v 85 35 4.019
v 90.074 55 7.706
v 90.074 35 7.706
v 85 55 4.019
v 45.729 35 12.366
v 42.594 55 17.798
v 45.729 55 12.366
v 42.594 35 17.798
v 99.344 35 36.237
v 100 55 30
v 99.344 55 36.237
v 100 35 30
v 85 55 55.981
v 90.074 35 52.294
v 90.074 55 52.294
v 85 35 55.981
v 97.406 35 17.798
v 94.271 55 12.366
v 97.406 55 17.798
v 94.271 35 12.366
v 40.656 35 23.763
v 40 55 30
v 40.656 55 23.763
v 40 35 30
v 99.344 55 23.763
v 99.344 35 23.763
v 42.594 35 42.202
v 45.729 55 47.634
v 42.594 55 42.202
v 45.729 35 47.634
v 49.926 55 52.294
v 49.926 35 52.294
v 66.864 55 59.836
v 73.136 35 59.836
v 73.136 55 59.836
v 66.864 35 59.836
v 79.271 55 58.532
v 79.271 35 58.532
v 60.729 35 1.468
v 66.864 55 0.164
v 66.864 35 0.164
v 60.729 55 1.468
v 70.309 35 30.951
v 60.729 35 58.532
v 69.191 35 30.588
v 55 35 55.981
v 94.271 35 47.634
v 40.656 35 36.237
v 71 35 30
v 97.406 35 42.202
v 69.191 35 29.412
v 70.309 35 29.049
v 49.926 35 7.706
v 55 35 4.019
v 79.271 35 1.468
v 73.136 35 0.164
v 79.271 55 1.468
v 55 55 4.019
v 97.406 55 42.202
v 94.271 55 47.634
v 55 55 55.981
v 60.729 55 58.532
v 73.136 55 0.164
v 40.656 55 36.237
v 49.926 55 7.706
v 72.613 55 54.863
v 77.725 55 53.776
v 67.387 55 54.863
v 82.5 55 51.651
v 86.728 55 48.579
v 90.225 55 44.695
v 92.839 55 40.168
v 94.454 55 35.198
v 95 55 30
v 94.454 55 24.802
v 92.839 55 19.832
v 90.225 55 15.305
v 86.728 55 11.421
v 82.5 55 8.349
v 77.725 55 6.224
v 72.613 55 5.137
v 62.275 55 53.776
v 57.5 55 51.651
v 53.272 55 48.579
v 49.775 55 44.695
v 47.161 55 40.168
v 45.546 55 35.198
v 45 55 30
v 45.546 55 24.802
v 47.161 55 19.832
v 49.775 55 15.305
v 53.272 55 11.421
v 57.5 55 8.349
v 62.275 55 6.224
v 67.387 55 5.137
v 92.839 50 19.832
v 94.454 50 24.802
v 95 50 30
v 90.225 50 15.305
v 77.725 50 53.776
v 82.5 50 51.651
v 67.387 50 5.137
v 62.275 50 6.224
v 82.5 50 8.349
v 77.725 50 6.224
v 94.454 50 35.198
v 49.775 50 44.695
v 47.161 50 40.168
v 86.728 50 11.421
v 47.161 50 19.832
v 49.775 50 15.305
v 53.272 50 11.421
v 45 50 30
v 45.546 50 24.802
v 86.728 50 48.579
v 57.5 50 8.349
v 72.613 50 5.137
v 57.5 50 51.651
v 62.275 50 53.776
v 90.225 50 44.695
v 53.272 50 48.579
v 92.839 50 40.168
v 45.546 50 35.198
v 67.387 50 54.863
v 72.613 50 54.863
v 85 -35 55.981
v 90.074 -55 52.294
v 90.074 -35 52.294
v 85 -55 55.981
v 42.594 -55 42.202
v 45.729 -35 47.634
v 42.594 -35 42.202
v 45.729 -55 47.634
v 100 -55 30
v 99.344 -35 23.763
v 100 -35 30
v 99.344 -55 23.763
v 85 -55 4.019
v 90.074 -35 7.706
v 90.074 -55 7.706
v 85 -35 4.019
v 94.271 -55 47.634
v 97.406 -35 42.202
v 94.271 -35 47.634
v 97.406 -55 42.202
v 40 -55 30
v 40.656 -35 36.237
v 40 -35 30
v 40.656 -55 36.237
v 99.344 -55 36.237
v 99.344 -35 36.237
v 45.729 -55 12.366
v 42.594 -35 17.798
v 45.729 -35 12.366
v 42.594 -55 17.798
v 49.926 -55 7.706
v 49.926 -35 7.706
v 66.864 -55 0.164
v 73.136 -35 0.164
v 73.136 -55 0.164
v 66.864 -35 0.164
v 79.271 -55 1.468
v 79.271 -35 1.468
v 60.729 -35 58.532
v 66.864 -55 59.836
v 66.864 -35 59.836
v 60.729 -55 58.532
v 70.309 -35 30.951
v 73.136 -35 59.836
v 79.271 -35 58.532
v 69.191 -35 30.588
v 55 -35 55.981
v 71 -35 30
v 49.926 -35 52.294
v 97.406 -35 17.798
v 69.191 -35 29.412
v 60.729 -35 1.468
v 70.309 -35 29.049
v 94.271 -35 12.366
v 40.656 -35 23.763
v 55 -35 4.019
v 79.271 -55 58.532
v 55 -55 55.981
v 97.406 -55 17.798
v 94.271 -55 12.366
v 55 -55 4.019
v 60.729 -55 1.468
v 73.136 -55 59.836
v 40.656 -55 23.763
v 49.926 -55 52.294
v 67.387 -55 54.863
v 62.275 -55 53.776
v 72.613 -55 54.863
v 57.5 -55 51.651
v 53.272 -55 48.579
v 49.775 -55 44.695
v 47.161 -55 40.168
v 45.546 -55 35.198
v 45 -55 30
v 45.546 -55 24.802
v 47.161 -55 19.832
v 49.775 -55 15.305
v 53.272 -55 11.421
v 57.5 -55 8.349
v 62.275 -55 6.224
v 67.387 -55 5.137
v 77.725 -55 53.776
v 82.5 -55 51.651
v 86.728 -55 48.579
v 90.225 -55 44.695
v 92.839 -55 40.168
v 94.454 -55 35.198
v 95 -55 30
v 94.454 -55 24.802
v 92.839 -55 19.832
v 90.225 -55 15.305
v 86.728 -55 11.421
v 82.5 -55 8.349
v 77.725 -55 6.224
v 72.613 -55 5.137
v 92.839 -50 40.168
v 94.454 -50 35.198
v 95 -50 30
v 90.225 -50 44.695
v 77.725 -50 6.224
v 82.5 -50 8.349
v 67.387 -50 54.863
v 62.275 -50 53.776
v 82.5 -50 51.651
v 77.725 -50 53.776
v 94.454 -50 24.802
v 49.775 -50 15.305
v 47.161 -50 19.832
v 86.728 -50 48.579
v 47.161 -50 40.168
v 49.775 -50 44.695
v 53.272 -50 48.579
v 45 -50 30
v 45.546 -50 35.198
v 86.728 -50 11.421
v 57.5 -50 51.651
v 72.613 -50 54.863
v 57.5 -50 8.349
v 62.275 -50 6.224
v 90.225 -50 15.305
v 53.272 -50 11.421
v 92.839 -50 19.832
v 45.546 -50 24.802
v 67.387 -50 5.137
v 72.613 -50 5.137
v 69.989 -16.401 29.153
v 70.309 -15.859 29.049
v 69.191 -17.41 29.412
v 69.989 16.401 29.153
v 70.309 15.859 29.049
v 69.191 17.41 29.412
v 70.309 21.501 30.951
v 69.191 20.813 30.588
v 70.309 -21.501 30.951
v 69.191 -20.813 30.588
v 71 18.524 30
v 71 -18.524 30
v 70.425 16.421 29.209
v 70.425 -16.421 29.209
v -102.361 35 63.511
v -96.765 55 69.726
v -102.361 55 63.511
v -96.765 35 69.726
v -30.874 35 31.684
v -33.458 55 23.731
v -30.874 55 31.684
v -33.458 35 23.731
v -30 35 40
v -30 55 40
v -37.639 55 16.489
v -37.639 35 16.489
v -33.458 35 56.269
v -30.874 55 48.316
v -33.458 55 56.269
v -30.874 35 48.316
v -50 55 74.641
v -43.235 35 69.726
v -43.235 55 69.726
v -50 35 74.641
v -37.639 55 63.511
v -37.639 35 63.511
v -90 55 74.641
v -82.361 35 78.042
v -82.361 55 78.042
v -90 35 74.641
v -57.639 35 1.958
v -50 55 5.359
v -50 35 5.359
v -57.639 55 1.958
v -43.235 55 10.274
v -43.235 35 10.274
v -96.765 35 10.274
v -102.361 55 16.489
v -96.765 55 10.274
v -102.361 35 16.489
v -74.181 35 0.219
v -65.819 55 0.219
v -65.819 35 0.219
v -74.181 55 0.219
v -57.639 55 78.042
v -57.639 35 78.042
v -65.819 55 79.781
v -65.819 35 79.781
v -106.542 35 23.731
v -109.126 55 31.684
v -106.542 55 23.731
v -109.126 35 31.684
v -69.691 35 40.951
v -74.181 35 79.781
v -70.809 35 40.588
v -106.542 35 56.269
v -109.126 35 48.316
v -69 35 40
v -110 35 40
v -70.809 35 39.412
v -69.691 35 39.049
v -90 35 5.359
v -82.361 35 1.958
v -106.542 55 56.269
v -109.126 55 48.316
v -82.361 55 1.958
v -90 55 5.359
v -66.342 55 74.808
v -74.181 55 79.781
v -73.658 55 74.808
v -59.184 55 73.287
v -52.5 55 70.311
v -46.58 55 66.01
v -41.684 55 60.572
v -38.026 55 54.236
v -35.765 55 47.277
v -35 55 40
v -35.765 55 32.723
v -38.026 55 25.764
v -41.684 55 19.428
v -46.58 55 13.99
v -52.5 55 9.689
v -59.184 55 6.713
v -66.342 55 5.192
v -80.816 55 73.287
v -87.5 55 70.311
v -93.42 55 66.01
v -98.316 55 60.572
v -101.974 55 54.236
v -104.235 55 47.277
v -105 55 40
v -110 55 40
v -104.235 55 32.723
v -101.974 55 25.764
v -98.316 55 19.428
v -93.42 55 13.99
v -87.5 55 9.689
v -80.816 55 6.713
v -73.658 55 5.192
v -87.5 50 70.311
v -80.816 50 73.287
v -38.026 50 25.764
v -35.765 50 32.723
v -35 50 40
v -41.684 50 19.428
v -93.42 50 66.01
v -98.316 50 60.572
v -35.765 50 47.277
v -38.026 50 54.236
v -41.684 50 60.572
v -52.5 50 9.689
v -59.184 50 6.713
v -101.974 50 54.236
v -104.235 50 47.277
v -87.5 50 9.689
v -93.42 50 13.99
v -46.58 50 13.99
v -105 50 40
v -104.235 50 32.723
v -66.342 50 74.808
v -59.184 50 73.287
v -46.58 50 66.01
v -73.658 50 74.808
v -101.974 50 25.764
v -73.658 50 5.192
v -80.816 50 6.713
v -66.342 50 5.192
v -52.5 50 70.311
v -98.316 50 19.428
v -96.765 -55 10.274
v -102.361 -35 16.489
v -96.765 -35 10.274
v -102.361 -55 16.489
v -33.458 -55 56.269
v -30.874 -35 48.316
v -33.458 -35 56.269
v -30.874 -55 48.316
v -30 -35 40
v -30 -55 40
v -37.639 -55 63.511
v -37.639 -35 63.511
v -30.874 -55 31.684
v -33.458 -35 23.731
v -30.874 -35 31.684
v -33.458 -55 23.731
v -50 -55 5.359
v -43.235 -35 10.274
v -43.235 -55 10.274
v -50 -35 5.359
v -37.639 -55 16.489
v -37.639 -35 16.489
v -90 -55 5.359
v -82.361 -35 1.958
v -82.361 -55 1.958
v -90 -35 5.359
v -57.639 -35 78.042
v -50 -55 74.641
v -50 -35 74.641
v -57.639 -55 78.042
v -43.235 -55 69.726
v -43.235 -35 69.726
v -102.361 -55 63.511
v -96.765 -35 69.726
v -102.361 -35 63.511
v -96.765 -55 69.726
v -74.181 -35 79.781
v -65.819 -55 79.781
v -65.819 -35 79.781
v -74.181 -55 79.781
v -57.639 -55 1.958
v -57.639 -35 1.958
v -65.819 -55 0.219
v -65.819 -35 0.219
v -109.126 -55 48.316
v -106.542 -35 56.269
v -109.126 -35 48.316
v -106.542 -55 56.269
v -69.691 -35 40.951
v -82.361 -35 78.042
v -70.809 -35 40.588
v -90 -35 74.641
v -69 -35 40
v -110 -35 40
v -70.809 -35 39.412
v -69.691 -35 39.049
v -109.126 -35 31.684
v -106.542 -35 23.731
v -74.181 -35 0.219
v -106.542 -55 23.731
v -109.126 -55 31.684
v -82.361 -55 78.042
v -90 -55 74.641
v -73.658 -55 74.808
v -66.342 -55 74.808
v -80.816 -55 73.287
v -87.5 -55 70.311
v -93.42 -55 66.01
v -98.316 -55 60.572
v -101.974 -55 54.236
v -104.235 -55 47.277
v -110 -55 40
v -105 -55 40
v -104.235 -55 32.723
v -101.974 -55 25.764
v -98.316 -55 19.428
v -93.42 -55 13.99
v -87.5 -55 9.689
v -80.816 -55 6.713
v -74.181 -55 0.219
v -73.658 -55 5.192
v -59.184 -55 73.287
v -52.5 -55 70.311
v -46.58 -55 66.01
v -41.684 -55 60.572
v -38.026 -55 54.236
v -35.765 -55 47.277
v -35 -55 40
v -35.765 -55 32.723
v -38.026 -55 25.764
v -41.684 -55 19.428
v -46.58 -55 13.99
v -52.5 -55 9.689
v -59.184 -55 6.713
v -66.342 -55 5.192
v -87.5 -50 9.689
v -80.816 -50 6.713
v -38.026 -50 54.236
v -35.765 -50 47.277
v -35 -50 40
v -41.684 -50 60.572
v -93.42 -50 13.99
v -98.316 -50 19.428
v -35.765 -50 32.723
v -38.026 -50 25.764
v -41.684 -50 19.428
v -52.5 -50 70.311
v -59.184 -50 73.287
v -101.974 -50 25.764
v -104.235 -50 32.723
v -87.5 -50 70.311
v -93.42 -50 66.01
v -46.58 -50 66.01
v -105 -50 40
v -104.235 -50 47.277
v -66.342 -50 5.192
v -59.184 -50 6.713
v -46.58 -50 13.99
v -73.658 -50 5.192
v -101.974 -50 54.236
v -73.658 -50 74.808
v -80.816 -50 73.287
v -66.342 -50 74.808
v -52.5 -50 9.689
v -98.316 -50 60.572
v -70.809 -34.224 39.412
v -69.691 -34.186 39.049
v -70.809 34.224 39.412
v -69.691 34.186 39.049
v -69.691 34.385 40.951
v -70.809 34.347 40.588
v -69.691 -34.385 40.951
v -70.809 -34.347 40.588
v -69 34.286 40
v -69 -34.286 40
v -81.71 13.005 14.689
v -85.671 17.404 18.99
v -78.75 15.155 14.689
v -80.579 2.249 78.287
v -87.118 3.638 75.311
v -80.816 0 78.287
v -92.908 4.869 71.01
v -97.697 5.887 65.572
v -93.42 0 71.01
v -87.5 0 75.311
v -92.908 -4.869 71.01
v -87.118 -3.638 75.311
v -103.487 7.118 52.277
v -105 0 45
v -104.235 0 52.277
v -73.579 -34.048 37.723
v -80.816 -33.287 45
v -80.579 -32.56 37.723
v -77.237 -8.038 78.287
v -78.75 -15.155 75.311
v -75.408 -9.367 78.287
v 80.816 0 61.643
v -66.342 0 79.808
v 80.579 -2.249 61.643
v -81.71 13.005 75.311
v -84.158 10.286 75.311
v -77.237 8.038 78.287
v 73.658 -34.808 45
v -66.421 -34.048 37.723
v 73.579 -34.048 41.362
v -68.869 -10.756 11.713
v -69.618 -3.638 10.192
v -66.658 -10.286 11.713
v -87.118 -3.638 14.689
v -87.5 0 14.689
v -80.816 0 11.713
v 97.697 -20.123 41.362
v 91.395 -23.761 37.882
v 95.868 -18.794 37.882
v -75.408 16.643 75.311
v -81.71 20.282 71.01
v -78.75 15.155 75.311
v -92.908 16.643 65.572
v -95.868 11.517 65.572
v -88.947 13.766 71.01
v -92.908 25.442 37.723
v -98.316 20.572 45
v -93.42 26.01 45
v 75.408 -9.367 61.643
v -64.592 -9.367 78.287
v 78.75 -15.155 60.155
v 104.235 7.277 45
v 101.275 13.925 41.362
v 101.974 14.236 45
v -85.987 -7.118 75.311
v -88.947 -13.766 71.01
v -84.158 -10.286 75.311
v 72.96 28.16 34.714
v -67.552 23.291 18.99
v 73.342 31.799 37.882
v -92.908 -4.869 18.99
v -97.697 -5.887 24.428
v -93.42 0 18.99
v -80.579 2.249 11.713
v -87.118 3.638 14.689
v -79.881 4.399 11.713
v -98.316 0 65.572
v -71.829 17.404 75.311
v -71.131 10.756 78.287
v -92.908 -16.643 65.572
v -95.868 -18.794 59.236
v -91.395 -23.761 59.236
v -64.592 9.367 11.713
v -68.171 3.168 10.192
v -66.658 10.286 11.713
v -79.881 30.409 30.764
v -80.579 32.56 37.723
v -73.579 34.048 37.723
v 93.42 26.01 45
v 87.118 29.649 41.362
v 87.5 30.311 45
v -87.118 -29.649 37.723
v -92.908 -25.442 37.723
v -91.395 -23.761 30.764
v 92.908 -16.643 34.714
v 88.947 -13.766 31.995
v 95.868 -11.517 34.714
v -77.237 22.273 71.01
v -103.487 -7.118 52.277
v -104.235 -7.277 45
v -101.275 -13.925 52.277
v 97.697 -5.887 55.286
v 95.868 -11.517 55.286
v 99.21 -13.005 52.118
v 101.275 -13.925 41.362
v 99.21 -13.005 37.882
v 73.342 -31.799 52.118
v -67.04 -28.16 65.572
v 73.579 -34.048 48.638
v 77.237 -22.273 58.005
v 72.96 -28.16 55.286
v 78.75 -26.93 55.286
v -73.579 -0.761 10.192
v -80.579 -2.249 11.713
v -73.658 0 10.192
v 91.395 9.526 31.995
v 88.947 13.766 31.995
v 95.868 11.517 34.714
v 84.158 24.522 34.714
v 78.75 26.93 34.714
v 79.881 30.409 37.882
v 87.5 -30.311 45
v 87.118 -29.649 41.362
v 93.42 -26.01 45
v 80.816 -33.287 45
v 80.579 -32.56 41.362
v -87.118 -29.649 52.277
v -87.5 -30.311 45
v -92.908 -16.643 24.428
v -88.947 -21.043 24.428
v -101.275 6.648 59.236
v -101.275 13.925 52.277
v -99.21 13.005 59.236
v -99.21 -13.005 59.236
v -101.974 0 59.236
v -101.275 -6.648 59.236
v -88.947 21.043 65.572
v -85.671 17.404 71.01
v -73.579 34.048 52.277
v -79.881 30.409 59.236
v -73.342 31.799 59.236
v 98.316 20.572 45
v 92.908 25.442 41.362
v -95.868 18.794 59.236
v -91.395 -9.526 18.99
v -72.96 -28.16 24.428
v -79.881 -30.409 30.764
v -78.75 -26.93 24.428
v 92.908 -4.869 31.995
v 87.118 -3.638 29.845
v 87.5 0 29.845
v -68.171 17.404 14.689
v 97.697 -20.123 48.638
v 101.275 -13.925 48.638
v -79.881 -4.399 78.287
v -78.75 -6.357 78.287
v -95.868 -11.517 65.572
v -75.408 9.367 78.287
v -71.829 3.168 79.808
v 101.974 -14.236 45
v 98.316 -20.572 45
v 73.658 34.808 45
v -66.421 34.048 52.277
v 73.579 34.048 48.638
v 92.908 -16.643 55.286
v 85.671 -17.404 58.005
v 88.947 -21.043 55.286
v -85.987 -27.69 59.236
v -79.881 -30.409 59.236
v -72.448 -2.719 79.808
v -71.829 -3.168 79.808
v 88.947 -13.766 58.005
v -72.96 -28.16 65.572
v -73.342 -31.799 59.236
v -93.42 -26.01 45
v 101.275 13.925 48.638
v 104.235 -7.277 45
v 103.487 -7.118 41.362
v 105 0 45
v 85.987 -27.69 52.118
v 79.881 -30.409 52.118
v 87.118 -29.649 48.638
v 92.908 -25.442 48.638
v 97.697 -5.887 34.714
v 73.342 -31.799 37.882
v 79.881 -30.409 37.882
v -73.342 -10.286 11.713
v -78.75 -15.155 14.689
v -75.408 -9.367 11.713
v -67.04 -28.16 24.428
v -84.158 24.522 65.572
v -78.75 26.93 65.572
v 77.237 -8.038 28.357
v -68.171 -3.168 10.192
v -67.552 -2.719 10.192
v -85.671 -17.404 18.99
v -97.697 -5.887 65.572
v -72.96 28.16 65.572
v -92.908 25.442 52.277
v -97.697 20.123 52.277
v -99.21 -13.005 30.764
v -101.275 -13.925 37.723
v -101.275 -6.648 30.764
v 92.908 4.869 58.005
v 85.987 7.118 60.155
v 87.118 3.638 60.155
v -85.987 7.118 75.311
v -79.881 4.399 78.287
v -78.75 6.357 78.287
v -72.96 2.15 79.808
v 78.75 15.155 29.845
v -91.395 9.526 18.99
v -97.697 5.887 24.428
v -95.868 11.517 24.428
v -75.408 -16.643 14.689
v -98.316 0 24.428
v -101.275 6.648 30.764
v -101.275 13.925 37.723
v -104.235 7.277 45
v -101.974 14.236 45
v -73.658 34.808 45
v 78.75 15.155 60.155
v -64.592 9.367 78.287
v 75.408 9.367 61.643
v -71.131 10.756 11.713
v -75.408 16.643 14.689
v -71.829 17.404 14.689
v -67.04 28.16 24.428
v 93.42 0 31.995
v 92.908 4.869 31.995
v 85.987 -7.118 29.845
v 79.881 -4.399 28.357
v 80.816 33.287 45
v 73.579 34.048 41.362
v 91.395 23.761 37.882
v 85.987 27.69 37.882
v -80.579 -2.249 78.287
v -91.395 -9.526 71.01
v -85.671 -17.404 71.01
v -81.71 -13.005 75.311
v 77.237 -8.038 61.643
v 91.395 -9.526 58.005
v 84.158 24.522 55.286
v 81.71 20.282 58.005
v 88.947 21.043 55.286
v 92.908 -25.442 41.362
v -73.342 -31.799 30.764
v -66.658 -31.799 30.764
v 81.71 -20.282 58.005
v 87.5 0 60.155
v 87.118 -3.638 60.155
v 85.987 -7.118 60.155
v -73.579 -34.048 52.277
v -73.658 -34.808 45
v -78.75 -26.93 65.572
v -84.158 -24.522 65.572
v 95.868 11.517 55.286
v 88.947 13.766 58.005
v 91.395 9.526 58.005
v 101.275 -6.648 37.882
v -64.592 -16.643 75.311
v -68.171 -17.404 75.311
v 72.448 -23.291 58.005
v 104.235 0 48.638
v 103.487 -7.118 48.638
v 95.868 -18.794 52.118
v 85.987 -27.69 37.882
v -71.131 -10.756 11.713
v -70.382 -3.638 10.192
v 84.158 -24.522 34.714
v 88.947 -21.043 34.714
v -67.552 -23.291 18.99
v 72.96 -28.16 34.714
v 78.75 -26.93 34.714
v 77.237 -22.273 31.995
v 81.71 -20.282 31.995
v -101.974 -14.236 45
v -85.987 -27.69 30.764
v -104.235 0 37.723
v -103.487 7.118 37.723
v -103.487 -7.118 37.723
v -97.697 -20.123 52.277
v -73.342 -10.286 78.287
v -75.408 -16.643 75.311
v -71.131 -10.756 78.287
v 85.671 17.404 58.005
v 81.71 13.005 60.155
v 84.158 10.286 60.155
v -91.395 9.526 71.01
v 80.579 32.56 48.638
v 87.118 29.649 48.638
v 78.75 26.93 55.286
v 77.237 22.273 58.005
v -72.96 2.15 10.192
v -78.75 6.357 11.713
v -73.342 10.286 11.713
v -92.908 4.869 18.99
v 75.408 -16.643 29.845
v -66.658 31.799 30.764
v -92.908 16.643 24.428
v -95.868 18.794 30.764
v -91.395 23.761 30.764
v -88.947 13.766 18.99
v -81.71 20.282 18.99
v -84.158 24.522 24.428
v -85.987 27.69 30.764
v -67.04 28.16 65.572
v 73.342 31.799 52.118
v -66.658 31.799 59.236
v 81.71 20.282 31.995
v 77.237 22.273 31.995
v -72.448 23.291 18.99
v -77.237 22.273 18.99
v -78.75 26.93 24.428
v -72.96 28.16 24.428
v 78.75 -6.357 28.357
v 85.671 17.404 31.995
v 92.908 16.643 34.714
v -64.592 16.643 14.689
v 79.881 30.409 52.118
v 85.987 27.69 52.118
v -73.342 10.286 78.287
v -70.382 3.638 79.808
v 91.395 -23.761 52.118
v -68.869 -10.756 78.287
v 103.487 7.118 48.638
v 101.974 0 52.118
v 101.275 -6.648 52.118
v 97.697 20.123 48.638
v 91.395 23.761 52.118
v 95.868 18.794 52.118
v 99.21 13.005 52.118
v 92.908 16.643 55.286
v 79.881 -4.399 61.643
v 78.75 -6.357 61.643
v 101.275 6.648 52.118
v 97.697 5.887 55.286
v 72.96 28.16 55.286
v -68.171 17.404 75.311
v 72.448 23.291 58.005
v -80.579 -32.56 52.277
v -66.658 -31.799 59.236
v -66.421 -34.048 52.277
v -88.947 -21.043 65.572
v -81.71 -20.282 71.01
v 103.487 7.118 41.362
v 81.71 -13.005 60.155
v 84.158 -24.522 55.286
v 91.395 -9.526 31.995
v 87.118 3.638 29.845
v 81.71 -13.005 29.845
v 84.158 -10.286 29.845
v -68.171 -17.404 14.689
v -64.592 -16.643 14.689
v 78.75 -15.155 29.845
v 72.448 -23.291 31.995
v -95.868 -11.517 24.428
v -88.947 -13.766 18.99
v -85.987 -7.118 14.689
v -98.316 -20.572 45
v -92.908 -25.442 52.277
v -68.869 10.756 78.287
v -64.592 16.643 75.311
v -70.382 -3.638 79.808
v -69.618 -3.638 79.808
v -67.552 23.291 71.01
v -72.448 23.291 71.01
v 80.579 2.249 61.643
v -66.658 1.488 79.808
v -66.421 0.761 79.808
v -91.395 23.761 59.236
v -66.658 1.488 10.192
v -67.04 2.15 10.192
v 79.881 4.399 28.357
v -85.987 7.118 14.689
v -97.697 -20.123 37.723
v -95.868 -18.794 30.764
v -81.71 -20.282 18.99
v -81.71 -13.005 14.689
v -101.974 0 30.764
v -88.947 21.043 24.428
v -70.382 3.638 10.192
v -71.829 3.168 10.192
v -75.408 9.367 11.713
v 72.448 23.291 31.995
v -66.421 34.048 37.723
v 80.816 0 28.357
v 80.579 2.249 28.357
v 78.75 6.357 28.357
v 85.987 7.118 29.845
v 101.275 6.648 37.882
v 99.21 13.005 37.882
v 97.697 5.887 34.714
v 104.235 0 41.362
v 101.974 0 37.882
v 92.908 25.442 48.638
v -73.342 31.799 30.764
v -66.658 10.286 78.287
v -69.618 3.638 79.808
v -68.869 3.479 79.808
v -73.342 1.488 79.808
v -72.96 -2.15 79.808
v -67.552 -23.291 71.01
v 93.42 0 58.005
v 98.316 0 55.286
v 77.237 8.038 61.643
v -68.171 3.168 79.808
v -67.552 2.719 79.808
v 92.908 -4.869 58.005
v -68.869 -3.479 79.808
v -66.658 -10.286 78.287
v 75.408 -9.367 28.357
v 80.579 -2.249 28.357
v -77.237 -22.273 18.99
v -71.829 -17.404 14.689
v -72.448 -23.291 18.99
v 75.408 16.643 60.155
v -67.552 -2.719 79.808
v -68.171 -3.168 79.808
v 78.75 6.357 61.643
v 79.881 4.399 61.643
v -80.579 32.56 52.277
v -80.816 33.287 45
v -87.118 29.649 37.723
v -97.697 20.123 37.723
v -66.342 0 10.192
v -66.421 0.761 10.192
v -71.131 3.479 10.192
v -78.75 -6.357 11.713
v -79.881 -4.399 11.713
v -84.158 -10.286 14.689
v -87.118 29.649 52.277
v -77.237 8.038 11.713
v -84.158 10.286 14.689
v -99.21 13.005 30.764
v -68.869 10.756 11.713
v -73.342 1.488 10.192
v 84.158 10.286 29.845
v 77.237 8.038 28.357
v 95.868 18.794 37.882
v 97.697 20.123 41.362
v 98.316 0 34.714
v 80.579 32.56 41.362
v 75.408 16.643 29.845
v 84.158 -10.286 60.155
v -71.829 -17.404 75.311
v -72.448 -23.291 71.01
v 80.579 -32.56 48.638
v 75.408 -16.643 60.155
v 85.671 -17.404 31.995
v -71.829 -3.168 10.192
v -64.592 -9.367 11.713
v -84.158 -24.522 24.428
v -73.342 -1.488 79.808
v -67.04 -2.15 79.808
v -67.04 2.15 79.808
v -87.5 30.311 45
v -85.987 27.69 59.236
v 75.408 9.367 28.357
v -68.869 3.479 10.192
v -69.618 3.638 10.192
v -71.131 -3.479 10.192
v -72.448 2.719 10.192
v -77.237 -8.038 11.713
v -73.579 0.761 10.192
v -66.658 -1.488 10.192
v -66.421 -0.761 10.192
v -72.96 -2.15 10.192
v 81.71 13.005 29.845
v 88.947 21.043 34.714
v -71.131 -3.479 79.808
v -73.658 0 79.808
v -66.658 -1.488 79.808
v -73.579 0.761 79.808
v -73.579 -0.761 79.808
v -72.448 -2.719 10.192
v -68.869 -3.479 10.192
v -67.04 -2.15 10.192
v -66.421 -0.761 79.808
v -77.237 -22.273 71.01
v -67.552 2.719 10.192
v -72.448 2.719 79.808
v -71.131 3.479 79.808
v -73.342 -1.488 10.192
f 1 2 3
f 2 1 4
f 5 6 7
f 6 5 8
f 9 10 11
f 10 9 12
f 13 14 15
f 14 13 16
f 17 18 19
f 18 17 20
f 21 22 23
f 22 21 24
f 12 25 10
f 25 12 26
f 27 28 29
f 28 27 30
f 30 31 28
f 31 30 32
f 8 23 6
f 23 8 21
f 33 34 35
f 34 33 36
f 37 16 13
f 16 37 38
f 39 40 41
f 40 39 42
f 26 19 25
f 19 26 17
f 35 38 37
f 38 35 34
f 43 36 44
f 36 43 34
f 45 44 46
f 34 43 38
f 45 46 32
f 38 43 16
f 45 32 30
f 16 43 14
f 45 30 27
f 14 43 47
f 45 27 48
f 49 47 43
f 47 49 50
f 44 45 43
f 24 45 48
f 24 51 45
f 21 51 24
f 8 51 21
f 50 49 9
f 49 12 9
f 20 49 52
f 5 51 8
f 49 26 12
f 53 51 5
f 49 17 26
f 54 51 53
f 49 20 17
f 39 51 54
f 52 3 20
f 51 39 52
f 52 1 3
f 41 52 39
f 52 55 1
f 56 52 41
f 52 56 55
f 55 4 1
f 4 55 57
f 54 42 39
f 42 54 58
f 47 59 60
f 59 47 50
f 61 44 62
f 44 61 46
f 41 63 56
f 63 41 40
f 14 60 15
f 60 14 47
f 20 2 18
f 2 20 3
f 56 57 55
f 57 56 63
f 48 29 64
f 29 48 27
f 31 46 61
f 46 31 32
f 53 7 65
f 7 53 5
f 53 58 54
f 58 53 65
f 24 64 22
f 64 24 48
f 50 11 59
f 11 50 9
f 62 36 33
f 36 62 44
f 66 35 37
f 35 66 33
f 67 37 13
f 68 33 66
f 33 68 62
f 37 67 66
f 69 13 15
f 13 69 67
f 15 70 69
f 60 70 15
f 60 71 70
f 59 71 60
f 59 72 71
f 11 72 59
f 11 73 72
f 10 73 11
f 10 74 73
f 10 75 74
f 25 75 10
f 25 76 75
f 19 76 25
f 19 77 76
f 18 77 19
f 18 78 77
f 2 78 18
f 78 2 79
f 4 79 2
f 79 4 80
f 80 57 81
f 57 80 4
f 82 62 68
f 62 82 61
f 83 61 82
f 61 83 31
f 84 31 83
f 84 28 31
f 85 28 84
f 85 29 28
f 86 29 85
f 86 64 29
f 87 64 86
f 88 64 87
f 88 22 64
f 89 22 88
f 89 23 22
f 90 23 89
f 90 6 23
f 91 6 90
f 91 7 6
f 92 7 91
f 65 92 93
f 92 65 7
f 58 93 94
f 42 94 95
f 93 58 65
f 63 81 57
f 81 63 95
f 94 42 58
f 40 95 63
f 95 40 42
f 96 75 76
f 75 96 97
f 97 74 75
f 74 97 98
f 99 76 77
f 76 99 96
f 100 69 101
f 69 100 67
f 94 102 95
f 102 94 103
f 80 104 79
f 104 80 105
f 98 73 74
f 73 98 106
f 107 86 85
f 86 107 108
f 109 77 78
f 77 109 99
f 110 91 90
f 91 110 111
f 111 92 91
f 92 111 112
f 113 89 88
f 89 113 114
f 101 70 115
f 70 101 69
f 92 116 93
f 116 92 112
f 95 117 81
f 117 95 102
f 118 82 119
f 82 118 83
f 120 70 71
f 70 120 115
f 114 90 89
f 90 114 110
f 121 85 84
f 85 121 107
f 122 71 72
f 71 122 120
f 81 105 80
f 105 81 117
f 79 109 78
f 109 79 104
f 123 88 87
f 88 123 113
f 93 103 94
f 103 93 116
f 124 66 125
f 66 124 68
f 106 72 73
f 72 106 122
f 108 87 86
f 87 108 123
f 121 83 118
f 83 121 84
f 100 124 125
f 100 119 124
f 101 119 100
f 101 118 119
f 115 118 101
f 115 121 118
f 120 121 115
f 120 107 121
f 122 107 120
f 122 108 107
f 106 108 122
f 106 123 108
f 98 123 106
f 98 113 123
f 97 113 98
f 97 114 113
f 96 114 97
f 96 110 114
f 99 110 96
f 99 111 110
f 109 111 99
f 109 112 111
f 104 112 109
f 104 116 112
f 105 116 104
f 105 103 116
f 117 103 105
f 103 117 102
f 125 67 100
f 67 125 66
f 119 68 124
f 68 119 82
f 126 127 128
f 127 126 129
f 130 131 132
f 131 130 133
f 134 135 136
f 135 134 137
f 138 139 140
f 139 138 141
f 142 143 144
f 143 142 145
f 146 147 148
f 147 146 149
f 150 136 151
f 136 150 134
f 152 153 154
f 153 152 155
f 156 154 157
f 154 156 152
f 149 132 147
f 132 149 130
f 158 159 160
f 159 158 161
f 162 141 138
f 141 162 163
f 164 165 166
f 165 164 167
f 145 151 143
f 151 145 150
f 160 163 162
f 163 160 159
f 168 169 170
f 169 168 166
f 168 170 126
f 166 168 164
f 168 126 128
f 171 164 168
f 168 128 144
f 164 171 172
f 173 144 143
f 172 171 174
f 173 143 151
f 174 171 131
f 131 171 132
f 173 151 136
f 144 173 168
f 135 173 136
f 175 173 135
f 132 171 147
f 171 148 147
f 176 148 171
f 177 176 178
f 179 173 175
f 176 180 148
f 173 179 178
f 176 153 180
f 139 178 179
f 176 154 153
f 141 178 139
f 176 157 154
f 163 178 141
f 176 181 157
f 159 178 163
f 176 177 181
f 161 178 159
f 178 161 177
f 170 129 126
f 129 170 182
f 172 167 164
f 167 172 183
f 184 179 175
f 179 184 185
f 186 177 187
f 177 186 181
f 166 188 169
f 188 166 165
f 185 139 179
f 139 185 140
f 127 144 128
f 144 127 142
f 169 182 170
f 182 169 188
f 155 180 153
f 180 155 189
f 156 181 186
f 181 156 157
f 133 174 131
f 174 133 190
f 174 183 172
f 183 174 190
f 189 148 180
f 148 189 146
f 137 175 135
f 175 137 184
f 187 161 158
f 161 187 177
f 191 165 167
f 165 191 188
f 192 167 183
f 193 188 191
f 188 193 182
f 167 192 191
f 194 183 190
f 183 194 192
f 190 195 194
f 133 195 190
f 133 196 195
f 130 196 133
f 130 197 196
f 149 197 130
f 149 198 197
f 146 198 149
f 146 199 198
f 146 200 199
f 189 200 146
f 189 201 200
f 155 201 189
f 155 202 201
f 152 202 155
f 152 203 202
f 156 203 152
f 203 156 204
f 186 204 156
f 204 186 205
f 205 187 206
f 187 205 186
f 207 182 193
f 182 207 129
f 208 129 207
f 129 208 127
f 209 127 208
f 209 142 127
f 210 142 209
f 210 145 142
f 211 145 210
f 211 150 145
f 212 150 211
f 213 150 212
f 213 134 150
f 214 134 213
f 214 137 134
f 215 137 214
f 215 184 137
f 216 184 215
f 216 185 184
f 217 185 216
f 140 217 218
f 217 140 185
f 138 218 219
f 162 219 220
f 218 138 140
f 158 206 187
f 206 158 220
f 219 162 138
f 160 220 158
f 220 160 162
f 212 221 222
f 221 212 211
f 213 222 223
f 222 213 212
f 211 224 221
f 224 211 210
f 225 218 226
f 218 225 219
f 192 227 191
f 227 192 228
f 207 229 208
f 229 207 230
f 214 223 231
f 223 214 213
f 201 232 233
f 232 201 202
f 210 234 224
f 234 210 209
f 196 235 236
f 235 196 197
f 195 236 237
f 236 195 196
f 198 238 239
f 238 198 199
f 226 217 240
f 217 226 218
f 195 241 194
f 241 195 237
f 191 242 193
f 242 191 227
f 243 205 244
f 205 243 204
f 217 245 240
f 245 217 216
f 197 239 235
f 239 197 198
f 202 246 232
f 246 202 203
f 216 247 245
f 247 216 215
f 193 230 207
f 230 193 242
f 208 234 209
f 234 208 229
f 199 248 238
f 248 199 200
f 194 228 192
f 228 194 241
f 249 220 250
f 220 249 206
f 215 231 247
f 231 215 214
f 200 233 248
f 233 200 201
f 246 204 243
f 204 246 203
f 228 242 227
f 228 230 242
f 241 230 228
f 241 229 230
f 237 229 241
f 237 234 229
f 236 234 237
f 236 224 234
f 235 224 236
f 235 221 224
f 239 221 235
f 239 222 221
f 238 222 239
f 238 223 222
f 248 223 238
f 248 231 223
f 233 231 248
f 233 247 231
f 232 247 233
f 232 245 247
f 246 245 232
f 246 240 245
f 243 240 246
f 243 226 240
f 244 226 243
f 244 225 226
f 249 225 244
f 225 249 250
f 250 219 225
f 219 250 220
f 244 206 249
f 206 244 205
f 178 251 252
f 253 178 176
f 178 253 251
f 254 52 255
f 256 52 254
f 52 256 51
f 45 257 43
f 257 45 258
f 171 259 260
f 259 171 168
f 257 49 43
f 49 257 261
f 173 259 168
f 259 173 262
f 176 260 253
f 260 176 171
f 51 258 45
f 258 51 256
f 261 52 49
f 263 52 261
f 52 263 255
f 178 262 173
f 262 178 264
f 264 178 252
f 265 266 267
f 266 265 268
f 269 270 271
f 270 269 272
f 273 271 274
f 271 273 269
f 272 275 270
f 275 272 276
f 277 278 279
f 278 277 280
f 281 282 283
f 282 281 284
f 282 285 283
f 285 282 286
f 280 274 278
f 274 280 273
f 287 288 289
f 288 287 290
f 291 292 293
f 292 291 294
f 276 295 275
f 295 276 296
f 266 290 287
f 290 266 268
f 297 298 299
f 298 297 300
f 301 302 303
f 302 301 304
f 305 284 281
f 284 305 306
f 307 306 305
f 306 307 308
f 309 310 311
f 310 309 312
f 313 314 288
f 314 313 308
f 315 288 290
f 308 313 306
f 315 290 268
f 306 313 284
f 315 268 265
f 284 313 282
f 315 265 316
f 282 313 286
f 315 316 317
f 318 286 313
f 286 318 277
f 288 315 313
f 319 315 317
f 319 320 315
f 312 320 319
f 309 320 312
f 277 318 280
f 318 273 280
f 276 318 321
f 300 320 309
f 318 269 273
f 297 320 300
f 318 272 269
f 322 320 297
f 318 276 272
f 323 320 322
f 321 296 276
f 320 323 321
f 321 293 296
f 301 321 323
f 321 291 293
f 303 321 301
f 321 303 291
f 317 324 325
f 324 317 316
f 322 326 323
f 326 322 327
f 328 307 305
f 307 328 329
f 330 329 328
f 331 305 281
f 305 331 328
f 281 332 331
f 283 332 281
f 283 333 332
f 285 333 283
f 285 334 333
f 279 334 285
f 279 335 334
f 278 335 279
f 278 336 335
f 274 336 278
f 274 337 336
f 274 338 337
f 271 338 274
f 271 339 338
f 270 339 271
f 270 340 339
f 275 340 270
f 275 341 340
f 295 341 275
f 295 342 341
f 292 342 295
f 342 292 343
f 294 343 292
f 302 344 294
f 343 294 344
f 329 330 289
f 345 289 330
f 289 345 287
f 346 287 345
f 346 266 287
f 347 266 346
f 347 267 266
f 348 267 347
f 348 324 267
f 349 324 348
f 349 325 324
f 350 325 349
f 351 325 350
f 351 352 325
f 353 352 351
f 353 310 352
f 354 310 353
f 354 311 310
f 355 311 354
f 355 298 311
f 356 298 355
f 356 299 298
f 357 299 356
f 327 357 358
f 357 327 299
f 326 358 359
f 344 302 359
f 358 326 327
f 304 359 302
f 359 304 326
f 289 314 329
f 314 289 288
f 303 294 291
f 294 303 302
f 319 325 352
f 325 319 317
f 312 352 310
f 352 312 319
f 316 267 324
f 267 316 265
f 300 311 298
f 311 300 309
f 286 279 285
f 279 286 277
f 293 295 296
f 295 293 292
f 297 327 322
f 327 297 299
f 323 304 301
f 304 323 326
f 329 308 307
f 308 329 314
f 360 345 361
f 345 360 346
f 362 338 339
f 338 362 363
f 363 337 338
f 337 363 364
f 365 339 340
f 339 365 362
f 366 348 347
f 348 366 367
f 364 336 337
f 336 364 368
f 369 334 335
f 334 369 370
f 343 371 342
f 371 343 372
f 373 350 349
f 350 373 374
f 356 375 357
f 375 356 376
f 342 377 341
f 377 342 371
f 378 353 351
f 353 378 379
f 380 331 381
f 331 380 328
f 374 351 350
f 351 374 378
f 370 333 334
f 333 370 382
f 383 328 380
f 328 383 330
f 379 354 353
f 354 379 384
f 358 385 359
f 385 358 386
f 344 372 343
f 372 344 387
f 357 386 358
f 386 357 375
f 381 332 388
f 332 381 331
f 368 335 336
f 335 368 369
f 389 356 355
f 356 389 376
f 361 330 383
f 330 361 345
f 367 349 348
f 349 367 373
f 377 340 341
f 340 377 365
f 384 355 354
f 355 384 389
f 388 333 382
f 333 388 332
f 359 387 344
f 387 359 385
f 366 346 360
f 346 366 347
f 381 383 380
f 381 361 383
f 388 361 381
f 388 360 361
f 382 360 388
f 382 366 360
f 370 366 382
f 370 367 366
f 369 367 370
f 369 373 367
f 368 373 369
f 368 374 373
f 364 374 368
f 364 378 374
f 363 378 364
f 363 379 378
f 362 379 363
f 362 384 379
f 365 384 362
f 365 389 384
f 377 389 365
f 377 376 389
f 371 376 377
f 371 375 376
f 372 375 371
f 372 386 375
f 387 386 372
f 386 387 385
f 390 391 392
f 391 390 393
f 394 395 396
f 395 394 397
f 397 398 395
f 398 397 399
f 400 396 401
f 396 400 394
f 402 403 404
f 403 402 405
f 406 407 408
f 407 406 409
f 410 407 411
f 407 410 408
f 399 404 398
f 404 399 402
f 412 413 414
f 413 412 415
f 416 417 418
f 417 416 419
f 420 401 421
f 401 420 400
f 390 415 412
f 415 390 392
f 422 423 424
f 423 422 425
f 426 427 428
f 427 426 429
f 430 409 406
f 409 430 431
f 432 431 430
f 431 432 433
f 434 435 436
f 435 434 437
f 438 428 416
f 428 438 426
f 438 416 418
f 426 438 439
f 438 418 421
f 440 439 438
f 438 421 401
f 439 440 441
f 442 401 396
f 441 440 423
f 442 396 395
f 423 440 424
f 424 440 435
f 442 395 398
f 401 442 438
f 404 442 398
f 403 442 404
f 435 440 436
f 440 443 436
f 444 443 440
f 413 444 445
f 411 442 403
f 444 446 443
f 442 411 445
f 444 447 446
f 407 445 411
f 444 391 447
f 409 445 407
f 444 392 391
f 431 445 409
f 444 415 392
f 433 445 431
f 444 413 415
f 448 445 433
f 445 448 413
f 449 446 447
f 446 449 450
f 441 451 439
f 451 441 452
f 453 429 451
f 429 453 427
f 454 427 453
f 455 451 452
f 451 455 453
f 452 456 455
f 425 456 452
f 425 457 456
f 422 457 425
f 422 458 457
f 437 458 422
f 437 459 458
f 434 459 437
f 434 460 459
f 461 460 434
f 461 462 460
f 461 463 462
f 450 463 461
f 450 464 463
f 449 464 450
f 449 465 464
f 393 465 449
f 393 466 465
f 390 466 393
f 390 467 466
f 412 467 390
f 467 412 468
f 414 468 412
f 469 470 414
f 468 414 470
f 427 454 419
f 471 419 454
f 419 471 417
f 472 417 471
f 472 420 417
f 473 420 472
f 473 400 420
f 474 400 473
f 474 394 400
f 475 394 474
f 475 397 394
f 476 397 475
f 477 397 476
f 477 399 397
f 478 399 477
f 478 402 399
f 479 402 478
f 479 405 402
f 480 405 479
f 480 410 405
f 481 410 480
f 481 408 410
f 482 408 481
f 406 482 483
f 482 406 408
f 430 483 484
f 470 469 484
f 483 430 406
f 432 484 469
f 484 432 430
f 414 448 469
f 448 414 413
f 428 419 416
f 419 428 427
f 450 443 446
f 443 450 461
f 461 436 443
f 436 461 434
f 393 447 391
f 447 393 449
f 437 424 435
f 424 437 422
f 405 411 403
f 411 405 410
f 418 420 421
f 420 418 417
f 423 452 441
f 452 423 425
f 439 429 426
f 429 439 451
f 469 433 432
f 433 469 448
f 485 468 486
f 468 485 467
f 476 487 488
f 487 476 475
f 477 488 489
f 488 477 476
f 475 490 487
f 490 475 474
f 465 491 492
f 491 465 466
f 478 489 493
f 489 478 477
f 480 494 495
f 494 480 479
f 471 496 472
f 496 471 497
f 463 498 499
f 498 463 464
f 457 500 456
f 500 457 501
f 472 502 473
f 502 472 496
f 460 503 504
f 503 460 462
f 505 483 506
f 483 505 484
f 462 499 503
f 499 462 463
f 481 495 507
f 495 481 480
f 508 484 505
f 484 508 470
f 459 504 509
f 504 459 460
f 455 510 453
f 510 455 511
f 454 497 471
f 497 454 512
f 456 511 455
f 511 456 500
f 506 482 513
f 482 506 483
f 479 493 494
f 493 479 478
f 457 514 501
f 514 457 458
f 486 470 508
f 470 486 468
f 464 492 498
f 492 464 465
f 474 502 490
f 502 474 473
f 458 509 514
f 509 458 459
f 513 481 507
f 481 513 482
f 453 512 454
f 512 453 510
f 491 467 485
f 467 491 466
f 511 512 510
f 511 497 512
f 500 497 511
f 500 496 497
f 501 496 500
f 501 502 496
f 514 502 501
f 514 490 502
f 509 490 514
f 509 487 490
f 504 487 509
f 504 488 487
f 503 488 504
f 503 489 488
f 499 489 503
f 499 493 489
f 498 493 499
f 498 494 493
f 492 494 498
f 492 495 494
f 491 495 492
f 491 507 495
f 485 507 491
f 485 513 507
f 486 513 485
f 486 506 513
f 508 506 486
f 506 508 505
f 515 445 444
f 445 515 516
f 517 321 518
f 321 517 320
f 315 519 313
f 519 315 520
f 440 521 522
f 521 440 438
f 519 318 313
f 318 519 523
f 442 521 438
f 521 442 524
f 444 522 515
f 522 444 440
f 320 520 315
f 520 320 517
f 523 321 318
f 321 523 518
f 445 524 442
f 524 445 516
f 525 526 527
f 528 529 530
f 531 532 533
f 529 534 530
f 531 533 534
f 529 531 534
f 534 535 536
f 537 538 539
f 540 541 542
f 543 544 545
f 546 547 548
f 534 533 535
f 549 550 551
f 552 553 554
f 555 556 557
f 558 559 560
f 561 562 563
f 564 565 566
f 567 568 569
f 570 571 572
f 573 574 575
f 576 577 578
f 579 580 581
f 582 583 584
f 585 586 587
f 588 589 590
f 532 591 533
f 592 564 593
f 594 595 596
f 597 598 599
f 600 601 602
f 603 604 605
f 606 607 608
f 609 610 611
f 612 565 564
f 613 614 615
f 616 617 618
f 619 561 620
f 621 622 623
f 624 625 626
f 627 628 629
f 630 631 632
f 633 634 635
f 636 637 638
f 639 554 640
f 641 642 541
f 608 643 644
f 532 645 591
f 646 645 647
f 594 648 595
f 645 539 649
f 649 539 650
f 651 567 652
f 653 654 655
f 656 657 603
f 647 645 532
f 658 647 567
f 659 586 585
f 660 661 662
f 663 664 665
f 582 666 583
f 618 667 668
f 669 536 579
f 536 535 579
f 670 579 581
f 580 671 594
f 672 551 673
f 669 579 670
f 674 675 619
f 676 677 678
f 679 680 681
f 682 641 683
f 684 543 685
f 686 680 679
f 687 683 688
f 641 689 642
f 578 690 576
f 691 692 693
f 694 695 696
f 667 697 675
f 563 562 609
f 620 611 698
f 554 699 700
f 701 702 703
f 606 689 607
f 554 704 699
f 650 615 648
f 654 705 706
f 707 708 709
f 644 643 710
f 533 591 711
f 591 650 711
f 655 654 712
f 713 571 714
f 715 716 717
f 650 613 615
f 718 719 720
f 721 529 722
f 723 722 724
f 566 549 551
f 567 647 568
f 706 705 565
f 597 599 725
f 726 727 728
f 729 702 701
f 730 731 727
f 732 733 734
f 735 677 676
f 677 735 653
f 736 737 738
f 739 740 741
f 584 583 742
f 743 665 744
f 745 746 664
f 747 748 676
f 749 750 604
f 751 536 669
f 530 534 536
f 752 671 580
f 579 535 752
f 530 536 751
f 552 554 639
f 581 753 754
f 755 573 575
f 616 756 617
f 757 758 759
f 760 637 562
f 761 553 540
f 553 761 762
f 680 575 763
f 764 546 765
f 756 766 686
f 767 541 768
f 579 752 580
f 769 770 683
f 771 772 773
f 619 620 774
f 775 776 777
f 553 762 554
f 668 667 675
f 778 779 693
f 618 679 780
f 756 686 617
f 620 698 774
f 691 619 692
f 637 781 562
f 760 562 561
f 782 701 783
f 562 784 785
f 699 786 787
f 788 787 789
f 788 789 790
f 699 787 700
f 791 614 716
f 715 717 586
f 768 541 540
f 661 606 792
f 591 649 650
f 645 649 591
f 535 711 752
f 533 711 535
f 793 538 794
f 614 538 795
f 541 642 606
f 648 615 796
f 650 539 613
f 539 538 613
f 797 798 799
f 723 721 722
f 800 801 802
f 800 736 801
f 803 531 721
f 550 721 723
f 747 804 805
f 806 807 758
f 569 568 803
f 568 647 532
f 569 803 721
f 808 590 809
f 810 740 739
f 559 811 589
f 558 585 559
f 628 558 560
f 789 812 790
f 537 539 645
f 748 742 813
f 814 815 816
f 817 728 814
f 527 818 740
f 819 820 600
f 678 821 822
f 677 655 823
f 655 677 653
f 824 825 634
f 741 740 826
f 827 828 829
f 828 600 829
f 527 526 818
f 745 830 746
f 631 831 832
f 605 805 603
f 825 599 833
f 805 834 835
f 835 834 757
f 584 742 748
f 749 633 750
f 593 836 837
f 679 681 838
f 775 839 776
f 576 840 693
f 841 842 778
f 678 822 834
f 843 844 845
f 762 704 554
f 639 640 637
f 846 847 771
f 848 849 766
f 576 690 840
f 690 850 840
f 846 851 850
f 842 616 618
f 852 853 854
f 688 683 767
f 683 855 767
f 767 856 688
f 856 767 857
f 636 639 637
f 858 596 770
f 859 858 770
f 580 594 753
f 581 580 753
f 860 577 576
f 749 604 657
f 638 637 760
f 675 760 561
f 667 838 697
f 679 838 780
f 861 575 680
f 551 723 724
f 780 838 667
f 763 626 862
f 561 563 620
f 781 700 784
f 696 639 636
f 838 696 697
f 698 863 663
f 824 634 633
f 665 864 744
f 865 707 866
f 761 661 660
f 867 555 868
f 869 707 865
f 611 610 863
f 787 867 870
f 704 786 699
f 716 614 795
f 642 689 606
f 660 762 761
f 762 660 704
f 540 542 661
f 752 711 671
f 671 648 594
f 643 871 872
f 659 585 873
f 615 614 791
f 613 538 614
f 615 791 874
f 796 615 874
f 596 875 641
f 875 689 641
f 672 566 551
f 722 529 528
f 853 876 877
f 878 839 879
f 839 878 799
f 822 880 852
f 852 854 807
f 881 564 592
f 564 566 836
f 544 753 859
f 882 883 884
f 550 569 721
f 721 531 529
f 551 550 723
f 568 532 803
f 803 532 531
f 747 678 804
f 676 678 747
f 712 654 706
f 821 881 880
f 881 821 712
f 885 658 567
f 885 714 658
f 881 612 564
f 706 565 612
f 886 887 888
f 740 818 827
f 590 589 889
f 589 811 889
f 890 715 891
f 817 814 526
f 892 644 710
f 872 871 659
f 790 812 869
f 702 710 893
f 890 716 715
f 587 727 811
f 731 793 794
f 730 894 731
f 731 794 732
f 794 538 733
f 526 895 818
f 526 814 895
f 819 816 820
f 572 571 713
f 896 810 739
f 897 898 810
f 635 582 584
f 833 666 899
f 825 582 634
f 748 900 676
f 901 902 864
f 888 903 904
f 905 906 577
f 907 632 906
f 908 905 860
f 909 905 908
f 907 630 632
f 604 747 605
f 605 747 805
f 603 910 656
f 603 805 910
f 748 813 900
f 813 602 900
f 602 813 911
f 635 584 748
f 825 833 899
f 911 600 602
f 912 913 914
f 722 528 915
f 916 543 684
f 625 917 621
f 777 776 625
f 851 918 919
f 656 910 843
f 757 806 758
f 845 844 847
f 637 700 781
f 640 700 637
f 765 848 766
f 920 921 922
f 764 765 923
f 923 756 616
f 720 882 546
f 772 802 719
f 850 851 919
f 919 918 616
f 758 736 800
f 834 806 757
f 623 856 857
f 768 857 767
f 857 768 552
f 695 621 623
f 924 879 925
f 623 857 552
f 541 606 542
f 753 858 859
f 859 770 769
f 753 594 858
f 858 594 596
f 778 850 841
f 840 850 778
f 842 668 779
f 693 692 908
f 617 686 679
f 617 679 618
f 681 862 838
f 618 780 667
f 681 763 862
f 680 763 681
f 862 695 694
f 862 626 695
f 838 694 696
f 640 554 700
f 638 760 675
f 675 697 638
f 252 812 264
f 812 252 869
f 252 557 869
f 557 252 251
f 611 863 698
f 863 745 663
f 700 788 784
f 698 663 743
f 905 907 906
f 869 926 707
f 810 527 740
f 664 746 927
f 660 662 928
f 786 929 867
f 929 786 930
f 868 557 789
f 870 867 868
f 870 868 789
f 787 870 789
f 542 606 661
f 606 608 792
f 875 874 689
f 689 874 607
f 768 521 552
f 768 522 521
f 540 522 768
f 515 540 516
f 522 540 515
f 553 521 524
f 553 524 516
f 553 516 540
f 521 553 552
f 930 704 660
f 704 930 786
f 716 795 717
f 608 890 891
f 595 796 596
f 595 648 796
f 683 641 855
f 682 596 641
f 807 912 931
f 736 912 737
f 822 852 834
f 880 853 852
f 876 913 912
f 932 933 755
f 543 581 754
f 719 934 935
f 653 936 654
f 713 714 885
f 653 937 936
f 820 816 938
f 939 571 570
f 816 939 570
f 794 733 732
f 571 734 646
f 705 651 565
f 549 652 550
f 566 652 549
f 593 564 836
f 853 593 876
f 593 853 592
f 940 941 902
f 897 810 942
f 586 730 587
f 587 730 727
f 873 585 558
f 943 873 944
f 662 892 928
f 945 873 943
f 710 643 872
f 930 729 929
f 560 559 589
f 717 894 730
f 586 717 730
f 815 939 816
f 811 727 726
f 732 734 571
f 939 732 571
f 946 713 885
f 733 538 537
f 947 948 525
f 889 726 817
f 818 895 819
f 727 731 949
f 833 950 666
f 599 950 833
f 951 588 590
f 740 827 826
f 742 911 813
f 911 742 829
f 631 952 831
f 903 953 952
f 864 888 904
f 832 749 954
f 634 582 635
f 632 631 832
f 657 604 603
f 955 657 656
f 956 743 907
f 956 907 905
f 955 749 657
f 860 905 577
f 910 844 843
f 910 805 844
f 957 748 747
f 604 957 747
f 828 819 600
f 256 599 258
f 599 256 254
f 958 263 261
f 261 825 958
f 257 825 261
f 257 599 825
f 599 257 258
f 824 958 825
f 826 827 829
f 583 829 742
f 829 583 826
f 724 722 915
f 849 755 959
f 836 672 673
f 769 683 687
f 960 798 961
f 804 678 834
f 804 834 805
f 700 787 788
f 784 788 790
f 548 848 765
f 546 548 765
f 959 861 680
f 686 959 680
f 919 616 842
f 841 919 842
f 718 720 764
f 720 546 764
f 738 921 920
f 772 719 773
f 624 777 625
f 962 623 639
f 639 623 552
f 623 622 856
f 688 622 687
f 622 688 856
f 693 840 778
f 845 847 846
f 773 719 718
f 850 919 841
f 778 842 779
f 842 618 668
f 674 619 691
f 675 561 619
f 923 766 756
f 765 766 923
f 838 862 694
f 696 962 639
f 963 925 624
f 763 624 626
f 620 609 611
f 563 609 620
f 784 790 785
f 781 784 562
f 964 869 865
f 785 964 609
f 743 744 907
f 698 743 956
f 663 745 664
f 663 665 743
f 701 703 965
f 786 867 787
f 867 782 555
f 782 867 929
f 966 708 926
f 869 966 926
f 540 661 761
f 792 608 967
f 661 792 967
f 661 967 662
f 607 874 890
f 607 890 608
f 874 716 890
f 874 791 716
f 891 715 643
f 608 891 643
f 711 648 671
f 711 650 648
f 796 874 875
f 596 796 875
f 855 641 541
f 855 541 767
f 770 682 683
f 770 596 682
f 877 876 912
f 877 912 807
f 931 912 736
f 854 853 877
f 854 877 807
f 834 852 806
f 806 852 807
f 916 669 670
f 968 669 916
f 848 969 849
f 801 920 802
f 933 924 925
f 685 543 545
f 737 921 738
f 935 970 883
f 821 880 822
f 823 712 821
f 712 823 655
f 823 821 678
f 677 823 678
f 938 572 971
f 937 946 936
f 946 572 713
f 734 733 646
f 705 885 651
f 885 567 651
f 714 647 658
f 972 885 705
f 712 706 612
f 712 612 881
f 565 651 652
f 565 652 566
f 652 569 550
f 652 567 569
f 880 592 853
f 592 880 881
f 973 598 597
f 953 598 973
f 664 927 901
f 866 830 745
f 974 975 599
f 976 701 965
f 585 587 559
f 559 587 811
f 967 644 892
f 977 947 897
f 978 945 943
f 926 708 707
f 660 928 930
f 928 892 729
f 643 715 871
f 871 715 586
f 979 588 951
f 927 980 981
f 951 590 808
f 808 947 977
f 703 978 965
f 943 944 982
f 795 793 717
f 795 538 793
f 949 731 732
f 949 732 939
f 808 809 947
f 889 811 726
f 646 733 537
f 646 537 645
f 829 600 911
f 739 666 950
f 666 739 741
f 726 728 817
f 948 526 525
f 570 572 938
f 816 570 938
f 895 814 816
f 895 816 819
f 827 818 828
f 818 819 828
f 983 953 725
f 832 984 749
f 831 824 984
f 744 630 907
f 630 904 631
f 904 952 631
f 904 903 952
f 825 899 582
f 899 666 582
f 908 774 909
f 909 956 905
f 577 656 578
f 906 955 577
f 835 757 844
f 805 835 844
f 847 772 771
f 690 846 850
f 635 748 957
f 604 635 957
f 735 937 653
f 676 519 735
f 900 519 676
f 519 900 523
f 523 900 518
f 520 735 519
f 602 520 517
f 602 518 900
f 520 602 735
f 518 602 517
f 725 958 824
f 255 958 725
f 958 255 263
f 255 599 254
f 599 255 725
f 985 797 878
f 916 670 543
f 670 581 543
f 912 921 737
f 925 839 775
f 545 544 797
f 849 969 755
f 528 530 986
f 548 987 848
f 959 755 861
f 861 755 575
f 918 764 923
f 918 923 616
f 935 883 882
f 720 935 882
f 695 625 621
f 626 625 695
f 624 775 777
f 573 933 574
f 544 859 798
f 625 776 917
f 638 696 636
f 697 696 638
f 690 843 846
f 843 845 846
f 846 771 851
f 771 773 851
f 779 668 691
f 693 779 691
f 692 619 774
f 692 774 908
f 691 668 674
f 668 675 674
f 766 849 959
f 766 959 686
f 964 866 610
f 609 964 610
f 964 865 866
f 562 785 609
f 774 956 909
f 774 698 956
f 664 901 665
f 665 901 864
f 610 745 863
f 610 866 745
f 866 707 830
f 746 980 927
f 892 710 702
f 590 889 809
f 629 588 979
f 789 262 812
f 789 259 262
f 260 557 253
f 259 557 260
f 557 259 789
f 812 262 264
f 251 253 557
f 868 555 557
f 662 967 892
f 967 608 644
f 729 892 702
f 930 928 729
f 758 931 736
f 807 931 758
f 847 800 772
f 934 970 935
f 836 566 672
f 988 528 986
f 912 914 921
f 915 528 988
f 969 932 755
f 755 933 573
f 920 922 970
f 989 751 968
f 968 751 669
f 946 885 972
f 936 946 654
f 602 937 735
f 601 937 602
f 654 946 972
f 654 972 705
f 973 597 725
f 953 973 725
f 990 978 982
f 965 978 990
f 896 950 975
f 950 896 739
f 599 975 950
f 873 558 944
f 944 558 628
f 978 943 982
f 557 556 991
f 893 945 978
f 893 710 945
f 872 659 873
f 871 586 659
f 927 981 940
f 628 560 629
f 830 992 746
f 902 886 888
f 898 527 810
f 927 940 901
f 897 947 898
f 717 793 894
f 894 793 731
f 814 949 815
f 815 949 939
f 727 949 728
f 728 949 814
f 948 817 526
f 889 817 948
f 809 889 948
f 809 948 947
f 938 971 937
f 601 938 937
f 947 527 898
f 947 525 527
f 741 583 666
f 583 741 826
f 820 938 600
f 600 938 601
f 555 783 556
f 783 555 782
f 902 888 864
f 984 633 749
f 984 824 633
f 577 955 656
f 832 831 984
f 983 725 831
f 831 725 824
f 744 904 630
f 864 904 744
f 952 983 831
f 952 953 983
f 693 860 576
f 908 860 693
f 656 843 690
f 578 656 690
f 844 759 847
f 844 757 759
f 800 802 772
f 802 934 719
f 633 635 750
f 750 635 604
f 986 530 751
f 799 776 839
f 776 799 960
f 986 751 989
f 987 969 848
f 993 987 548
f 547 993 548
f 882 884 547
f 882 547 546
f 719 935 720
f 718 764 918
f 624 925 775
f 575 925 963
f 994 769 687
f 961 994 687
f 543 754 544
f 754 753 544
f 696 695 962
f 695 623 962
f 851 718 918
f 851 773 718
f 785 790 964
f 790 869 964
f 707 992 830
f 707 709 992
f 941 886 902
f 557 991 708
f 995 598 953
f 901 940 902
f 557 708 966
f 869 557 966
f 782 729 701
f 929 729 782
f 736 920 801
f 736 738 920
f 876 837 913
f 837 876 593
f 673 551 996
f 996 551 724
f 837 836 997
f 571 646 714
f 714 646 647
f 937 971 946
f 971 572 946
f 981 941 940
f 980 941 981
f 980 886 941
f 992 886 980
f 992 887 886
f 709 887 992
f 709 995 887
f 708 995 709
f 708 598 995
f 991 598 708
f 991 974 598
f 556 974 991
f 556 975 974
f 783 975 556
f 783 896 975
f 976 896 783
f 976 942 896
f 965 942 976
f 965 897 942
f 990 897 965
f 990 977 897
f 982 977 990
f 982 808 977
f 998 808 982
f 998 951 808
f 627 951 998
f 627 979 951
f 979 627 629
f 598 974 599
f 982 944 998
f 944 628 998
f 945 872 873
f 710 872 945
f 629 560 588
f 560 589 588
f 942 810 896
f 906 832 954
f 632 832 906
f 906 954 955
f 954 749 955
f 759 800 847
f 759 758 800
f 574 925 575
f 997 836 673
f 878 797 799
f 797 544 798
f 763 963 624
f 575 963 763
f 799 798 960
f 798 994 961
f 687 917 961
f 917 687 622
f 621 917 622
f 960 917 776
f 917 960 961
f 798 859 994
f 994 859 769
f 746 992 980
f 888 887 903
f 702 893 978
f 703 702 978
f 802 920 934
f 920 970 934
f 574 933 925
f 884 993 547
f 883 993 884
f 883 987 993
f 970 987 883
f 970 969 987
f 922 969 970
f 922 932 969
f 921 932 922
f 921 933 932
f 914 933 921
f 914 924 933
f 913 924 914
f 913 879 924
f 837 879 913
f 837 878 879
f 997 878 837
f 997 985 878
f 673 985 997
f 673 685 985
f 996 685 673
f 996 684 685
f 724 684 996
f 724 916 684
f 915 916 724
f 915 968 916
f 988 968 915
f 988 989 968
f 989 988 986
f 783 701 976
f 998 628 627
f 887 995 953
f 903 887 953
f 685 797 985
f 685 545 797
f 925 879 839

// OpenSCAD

front_wheel_radius = 30;
back_wheel_radius = 40;
wheel_width = 20;

axe_spacing = 2*(front_wheel_radius+back_wheel_radius);
wheel_spacing = axe_spacing/2;

car_length = axe_spacing + front_wheel_radius+back_wheel_radius + 20;

module wheel(radius, width)
{
	difference()
	{
		cylinder(h=width,r=radius);
		translate([0,0,width-5])
			cylinder(h=width,r=radius-5);
	}
}

module front_wheel()
{
	wheel(front_wheel_radius, wheel_width);
}

module back_wheel()
{
	wheel(back_wheel_radius, wheel_width);
}

module wheel_pair(spacing)
{
	// axe
	rotate([90,0,0]) cylinder(h=spacing,r=1,center=true);
	// left wheel
	translate([0,spacing/2,0]) rotate([-90,0,0]) child();
	// right wheel
	translate([0,-spacing/2,0]) rotate([90,0,0]) child();
}

// car body
translate([-axe_spacing/2,0,wheel_spacing/2+front_wheel_radius/3])
	hull()
	{
		sphere(wheel_spacing/2);
		translate([axe_spacing,0,0]) scale([1,1,1/2]) sphere(wheel_spacing/2);
	}

// front wheels + axe
translate([axe_spacing/2,0,front_wheel_radius]) wheel_pair(wheel_spacing) front_wheel();
// back wheels + axe
translate([-axe_spacing/2,0,back_wheel_radius]) wheel_pair(wheel_spacing) back_wheel();

